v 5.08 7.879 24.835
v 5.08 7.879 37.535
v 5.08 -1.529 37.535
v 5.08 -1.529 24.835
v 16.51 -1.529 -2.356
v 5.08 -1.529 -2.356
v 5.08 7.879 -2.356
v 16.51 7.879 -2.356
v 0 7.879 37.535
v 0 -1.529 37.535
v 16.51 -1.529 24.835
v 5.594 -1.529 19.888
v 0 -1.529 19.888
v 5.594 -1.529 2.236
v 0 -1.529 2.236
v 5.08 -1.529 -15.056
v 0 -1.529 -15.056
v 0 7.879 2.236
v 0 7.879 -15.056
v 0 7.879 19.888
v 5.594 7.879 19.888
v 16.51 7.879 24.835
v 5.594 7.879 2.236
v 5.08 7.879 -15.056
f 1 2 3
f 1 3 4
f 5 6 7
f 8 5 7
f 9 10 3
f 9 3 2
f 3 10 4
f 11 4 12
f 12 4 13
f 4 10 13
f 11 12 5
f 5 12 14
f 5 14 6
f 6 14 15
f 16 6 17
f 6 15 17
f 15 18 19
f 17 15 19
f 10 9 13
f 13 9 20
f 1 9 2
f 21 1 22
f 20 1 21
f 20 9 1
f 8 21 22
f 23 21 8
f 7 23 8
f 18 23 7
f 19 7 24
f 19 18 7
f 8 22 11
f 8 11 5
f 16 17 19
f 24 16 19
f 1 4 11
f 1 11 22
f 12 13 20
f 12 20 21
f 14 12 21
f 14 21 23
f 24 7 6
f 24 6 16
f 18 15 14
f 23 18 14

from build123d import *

# Parameters (mm, degrees)
SKETCH1_W               = 27.191844216
SKETCH1_H               = 9.407407408
BOSS_EXTRUDE1_DEPTH     = 16.51
SKETCH1_3_W             = 12.7
SKETCH1_3_H             = 9.407407408
BOSS_EXTRUDE2_DEPTH     = 5.08
CUT_EXTRUDE1_DEPTH      = 20.828
CUT_EXTRUDE1_DEPTH_BACK = 20.828
SKETCH2_W               = 5.594013652
SKETCH2_H               = 17.651209439


with BuildPart() as part:
    # Sketch1 → Boss-Extrude1 (new body)
    with BuildSketch(Plane(origin=(0, 0, 0), x_dir=(0, 0, -1), z_dir=(1, 0, 0))):
        with Locations((-11.239440409, 3.175)):
            Rectangle(SKETCH1_W, SKETCH1_H)
    extrude(amount=BOSS_EXTRUDE1_DEPTH)

    # Sketch1<3> → Boss-Extrude2 (add)
    with BuildSketch(Plane(origin=(0, 0, 0), x_dir=(0, 0, -1), z_dir=(1, 0, 0))):
        with Locations((-31.185362517, 3.175)):
            Rectangle(SKETCH1_3_W, SKETCH1_3_H)
        with Locations((8.706481699, 3.175)):
            Rectangle(SKETCH1_3_W, SKETCH1_3_H)
    extrude(amount=BOSS_EXTRUDE2_DEPTH)

    # Sketch2 → Cut-Extrude1 (cut, two sides: drawn at the far end of the back side and taken through both)
    with BuildSketch(Plane(origin=(0, 0, 0), x_dir=(1, 0, 0), z_dir=(0, 1, 0)).offset(-CUT_EXTRUDE1_DEPTH_BACK)):
        with Locations((2.797006826, -11.06204132)):
            Rectangle(SKETCH2_W, SKETCH2_H)
    extrude(amount=CUT_EXTRUDE1_DEPTH + CUT_EXTRUDE1_DEPTH_BACK, mode=Mode.SUBTRACT)


solid = part.part
